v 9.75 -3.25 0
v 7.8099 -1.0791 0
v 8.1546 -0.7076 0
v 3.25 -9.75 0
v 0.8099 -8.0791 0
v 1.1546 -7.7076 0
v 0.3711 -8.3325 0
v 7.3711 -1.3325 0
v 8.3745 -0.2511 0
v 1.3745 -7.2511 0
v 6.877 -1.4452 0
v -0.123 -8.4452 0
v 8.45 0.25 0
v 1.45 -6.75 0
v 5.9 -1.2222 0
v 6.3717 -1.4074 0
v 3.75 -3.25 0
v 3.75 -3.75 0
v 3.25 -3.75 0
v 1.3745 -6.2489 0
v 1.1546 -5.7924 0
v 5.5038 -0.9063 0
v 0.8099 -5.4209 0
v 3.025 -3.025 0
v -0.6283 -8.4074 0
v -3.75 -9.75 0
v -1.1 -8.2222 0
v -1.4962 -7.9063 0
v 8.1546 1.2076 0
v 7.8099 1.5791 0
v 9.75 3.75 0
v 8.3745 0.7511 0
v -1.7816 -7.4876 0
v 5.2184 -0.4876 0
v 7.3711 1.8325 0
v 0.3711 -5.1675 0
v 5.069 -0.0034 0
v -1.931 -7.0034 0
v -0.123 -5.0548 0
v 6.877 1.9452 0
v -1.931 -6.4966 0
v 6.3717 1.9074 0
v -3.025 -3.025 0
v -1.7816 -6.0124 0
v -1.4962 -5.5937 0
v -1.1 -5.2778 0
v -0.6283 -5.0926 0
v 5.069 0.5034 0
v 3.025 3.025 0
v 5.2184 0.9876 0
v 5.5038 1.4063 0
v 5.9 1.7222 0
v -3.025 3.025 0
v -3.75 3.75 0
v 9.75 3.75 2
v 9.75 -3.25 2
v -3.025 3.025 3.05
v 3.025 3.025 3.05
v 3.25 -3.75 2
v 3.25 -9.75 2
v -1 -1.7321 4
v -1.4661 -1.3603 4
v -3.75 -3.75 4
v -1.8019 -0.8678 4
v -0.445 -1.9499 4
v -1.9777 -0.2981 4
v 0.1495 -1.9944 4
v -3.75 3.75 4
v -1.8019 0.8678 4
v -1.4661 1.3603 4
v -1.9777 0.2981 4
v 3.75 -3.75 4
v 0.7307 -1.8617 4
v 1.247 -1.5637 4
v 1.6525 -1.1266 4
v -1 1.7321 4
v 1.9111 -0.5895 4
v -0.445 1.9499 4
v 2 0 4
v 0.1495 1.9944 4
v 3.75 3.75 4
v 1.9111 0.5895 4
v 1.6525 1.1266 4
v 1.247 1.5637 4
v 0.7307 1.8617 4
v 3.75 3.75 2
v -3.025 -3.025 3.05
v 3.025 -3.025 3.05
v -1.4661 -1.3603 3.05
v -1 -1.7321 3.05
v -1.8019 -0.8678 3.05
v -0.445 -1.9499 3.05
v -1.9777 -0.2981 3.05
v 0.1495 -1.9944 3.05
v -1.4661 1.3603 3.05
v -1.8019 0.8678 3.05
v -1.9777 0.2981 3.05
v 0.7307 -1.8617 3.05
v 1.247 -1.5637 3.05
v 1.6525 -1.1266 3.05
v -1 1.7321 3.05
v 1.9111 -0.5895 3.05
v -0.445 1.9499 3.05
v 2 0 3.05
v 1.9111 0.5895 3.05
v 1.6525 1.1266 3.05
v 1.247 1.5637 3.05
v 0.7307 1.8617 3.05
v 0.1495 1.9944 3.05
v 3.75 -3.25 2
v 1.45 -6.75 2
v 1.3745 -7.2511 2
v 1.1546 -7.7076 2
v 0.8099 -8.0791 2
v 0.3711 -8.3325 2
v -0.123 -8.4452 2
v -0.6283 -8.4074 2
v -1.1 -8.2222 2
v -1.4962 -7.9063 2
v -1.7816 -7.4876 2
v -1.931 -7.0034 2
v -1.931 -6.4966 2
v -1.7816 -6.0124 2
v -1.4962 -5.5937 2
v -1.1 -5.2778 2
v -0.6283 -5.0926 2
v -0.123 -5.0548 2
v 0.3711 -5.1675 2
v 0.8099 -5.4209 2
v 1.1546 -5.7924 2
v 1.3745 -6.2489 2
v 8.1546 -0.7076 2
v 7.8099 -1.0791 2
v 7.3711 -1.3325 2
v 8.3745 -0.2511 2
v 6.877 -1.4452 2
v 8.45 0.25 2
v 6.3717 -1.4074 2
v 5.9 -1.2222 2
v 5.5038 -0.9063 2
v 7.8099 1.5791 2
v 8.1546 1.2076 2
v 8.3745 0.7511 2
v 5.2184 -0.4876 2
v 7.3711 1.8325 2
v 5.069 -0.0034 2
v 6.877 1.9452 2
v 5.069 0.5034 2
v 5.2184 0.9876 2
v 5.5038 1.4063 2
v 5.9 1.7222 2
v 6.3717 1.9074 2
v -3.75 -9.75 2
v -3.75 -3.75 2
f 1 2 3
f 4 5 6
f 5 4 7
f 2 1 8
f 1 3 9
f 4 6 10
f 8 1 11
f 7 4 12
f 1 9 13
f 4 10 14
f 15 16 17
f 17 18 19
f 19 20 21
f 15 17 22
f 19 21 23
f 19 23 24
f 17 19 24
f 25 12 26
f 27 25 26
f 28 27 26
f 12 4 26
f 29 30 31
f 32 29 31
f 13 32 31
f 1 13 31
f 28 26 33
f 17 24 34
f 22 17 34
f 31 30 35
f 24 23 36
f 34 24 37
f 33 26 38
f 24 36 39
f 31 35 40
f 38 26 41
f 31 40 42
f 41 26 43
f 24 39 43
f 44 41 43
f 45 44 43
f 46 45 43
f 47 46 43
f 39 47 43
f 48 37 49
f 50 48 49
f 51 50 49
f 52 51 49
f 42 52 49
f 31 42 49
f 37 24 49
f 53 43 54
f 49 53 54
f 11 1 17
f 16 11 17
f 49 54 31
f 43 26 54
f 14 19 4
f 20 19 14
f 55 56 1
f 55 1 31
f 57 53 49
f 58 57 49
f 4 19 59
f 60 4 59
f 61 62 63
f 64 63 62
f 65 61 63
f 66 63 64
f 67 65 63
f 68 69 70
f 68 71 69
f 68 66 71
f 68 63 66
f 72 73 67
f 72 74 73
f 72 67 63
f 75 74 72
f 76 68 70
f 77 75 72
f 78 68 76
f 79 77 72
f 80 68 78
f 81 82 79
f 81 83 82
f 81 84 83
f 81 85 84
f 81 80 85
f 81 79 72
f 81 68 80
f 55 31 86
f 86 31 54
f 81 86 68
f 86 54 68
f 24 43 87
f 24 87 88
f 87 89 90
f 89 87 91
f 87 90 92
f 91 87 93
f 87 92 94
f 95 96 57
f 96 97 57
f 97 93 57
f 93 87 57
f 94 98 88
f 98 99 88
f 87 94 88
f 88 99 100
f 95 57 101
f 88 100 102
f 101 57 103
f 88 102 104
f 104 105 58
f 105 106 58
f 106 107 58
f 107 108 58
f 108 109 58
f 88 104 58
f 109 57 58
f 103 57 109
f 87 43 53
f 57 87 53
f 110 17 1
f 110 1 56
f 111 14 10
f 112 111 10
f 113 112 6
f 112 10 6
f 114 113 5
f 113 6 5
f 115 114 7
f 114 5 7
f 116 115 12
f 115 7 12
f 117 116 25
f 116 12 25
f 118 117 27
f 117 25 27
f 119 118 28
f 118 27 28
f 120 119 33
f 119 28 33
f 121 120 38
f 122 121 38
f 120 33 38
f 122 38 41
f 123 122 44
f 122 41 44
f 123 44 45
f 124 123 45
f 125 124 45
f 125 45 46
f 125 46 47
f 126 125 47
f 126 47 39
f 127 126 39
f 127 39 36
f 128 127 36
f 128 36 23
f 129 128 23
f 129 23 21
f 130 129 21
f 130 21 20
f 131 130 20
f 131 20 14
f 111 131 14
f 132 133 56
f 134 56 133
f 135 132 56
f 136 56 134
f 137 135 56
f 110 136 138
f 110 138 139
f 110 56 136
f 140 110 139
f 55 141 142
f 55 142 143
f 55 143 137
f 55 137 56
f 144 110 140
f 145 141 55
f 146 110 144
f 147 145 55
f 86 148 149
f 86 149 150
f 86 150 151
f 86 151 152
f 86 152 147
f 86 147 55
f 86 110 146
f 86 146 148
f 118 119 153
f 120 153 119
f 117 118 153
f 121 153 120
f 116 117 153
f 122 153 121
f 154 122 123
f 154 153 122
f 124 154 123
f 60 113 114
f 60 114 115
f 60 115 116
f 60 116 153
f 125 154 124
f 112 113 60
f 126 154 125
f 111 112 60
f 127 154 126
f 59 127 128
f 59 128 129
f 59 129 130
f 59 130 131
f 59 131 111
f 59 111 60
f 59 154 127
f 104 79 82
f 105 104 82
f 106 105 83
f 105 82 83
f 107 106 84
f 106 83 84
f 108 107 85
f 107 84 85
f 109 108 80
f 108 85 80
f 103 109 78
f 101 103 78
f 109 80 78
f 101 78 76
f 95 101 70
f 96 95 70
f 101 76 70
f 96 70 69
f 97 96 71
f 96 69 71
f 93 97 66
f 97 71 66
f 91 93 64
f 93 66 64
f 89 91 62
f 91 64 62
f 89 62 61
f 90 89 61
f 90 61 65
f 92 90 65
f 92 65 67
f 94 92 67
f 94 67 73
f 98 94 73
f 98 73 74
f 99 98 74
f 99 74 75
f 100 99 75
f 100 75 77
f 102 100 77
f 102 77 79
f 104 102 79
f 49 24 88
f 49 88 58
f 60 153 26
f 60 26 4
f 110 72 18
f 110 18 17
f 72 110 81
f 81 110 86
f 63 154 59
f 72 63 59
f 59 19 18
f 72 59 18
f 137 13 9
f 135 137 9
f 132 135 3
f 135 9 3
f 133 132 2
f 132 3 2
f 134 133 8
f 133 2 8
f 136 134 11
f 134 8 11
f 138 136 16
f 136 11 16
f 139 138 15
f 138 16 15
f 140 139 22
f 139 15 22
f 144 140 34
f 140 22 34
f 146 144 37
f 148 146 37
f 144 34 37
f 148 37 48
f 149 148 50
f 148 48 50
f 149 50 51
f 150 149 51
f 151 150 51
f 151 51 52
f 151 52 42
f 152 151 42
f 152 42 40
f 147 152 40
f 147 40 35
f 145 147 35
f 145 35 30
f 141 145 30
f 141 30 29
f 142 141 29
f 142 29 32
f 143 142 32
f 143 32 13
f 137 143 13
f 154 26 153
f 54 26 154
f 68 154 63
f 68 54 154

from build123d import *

# Parameters (mm, degrees)
SKETCH_W     = 7.5
SKETCH_H     = 7.5
SKETCH_W_2   = 6.05
SKETCH_H_2   = 6.05
PAD_DEPTH    = 3.05
SKETCH001_W  = 7.5
SKETCH001_H  = 7.5
PAD001_DEPTH = 0.95
SKETCH002_W  = 7
SKETCH002_H  = 2
PAD002_DEPTH = 6
SKETCH004_W  = 7
SKETCH004_H  = 2
PAD003_DEPTH = 6
SKETCH005_R  = 1.7
HOLE_DEPTH   = 25
SKETCH006_R  = 2
POCKET_DEPTH = 1


with BuildPart() as part:
    # Sketch → Pad (new body)
    with BuildSketch(Plane.XY):
        Rectangle(SKETCH_W, SKETCH_H)
        Rectangle(SKETCH_W_2, SKETCH_H_2, mode=Mode.SUBTRACT)
    extrude(amount=PAD_DEPTH)

    # Sketch001 (on Face10 of Pad) → Pad001 (join)
    with BuildSketch(Plane.XY.offset(3.05)):
        Rectangle(SKETCH001_W, SKETCH001_H)
    extrude(amount=PAD001_DEPTH)

    # Sketch002 (on Face10 of Pad001) → Pad002 (join)
    with BuildSketch(Plane.XZ.offset(3.75)):
        with Locations((-0.25, 1)):
            Rectangle(SKETCH002_W, SKETCH002_H)
    extrude(amount=PAD002_DEPTH)

    # Sketch004 (on Face2 of Pad002) → Pad003 (join)
    with BuildSketch(Plane.YZ.offset(3.75)):
        with Locations((0.25, 1)):
            Rectangle(SKETCH004_W, SKETCH004_H)
    extrude(amount=PAD003_DEPTH)

    # Sketch005 (on Face11 of Pad003) → Hole (cut)
    with BuildSketch(Plane(origin=(0, 0, 0), x_dir=(1, 0, 0), z_dir=(0, 0, -1))):
        with Locations((6.75, -0.25)):
            Circle(SKETCH005_R)
        with Locations((-0.25, 6.75)):
            Circle(SKETCH005_R)
    extrude(amount=-HOLE_DEPTH, mode=Mode.SUBTRACT)

    # Sketch006 (on Face3 of Hole) → Pocket (cut)
    with BuildSketch(Plane.XY.offset(4)):
        Circle(SKETCH006_R)
    extrude(amount=-POCKET_DEPTH, mode=Mode.SUBTRACT)


solid = part.part
